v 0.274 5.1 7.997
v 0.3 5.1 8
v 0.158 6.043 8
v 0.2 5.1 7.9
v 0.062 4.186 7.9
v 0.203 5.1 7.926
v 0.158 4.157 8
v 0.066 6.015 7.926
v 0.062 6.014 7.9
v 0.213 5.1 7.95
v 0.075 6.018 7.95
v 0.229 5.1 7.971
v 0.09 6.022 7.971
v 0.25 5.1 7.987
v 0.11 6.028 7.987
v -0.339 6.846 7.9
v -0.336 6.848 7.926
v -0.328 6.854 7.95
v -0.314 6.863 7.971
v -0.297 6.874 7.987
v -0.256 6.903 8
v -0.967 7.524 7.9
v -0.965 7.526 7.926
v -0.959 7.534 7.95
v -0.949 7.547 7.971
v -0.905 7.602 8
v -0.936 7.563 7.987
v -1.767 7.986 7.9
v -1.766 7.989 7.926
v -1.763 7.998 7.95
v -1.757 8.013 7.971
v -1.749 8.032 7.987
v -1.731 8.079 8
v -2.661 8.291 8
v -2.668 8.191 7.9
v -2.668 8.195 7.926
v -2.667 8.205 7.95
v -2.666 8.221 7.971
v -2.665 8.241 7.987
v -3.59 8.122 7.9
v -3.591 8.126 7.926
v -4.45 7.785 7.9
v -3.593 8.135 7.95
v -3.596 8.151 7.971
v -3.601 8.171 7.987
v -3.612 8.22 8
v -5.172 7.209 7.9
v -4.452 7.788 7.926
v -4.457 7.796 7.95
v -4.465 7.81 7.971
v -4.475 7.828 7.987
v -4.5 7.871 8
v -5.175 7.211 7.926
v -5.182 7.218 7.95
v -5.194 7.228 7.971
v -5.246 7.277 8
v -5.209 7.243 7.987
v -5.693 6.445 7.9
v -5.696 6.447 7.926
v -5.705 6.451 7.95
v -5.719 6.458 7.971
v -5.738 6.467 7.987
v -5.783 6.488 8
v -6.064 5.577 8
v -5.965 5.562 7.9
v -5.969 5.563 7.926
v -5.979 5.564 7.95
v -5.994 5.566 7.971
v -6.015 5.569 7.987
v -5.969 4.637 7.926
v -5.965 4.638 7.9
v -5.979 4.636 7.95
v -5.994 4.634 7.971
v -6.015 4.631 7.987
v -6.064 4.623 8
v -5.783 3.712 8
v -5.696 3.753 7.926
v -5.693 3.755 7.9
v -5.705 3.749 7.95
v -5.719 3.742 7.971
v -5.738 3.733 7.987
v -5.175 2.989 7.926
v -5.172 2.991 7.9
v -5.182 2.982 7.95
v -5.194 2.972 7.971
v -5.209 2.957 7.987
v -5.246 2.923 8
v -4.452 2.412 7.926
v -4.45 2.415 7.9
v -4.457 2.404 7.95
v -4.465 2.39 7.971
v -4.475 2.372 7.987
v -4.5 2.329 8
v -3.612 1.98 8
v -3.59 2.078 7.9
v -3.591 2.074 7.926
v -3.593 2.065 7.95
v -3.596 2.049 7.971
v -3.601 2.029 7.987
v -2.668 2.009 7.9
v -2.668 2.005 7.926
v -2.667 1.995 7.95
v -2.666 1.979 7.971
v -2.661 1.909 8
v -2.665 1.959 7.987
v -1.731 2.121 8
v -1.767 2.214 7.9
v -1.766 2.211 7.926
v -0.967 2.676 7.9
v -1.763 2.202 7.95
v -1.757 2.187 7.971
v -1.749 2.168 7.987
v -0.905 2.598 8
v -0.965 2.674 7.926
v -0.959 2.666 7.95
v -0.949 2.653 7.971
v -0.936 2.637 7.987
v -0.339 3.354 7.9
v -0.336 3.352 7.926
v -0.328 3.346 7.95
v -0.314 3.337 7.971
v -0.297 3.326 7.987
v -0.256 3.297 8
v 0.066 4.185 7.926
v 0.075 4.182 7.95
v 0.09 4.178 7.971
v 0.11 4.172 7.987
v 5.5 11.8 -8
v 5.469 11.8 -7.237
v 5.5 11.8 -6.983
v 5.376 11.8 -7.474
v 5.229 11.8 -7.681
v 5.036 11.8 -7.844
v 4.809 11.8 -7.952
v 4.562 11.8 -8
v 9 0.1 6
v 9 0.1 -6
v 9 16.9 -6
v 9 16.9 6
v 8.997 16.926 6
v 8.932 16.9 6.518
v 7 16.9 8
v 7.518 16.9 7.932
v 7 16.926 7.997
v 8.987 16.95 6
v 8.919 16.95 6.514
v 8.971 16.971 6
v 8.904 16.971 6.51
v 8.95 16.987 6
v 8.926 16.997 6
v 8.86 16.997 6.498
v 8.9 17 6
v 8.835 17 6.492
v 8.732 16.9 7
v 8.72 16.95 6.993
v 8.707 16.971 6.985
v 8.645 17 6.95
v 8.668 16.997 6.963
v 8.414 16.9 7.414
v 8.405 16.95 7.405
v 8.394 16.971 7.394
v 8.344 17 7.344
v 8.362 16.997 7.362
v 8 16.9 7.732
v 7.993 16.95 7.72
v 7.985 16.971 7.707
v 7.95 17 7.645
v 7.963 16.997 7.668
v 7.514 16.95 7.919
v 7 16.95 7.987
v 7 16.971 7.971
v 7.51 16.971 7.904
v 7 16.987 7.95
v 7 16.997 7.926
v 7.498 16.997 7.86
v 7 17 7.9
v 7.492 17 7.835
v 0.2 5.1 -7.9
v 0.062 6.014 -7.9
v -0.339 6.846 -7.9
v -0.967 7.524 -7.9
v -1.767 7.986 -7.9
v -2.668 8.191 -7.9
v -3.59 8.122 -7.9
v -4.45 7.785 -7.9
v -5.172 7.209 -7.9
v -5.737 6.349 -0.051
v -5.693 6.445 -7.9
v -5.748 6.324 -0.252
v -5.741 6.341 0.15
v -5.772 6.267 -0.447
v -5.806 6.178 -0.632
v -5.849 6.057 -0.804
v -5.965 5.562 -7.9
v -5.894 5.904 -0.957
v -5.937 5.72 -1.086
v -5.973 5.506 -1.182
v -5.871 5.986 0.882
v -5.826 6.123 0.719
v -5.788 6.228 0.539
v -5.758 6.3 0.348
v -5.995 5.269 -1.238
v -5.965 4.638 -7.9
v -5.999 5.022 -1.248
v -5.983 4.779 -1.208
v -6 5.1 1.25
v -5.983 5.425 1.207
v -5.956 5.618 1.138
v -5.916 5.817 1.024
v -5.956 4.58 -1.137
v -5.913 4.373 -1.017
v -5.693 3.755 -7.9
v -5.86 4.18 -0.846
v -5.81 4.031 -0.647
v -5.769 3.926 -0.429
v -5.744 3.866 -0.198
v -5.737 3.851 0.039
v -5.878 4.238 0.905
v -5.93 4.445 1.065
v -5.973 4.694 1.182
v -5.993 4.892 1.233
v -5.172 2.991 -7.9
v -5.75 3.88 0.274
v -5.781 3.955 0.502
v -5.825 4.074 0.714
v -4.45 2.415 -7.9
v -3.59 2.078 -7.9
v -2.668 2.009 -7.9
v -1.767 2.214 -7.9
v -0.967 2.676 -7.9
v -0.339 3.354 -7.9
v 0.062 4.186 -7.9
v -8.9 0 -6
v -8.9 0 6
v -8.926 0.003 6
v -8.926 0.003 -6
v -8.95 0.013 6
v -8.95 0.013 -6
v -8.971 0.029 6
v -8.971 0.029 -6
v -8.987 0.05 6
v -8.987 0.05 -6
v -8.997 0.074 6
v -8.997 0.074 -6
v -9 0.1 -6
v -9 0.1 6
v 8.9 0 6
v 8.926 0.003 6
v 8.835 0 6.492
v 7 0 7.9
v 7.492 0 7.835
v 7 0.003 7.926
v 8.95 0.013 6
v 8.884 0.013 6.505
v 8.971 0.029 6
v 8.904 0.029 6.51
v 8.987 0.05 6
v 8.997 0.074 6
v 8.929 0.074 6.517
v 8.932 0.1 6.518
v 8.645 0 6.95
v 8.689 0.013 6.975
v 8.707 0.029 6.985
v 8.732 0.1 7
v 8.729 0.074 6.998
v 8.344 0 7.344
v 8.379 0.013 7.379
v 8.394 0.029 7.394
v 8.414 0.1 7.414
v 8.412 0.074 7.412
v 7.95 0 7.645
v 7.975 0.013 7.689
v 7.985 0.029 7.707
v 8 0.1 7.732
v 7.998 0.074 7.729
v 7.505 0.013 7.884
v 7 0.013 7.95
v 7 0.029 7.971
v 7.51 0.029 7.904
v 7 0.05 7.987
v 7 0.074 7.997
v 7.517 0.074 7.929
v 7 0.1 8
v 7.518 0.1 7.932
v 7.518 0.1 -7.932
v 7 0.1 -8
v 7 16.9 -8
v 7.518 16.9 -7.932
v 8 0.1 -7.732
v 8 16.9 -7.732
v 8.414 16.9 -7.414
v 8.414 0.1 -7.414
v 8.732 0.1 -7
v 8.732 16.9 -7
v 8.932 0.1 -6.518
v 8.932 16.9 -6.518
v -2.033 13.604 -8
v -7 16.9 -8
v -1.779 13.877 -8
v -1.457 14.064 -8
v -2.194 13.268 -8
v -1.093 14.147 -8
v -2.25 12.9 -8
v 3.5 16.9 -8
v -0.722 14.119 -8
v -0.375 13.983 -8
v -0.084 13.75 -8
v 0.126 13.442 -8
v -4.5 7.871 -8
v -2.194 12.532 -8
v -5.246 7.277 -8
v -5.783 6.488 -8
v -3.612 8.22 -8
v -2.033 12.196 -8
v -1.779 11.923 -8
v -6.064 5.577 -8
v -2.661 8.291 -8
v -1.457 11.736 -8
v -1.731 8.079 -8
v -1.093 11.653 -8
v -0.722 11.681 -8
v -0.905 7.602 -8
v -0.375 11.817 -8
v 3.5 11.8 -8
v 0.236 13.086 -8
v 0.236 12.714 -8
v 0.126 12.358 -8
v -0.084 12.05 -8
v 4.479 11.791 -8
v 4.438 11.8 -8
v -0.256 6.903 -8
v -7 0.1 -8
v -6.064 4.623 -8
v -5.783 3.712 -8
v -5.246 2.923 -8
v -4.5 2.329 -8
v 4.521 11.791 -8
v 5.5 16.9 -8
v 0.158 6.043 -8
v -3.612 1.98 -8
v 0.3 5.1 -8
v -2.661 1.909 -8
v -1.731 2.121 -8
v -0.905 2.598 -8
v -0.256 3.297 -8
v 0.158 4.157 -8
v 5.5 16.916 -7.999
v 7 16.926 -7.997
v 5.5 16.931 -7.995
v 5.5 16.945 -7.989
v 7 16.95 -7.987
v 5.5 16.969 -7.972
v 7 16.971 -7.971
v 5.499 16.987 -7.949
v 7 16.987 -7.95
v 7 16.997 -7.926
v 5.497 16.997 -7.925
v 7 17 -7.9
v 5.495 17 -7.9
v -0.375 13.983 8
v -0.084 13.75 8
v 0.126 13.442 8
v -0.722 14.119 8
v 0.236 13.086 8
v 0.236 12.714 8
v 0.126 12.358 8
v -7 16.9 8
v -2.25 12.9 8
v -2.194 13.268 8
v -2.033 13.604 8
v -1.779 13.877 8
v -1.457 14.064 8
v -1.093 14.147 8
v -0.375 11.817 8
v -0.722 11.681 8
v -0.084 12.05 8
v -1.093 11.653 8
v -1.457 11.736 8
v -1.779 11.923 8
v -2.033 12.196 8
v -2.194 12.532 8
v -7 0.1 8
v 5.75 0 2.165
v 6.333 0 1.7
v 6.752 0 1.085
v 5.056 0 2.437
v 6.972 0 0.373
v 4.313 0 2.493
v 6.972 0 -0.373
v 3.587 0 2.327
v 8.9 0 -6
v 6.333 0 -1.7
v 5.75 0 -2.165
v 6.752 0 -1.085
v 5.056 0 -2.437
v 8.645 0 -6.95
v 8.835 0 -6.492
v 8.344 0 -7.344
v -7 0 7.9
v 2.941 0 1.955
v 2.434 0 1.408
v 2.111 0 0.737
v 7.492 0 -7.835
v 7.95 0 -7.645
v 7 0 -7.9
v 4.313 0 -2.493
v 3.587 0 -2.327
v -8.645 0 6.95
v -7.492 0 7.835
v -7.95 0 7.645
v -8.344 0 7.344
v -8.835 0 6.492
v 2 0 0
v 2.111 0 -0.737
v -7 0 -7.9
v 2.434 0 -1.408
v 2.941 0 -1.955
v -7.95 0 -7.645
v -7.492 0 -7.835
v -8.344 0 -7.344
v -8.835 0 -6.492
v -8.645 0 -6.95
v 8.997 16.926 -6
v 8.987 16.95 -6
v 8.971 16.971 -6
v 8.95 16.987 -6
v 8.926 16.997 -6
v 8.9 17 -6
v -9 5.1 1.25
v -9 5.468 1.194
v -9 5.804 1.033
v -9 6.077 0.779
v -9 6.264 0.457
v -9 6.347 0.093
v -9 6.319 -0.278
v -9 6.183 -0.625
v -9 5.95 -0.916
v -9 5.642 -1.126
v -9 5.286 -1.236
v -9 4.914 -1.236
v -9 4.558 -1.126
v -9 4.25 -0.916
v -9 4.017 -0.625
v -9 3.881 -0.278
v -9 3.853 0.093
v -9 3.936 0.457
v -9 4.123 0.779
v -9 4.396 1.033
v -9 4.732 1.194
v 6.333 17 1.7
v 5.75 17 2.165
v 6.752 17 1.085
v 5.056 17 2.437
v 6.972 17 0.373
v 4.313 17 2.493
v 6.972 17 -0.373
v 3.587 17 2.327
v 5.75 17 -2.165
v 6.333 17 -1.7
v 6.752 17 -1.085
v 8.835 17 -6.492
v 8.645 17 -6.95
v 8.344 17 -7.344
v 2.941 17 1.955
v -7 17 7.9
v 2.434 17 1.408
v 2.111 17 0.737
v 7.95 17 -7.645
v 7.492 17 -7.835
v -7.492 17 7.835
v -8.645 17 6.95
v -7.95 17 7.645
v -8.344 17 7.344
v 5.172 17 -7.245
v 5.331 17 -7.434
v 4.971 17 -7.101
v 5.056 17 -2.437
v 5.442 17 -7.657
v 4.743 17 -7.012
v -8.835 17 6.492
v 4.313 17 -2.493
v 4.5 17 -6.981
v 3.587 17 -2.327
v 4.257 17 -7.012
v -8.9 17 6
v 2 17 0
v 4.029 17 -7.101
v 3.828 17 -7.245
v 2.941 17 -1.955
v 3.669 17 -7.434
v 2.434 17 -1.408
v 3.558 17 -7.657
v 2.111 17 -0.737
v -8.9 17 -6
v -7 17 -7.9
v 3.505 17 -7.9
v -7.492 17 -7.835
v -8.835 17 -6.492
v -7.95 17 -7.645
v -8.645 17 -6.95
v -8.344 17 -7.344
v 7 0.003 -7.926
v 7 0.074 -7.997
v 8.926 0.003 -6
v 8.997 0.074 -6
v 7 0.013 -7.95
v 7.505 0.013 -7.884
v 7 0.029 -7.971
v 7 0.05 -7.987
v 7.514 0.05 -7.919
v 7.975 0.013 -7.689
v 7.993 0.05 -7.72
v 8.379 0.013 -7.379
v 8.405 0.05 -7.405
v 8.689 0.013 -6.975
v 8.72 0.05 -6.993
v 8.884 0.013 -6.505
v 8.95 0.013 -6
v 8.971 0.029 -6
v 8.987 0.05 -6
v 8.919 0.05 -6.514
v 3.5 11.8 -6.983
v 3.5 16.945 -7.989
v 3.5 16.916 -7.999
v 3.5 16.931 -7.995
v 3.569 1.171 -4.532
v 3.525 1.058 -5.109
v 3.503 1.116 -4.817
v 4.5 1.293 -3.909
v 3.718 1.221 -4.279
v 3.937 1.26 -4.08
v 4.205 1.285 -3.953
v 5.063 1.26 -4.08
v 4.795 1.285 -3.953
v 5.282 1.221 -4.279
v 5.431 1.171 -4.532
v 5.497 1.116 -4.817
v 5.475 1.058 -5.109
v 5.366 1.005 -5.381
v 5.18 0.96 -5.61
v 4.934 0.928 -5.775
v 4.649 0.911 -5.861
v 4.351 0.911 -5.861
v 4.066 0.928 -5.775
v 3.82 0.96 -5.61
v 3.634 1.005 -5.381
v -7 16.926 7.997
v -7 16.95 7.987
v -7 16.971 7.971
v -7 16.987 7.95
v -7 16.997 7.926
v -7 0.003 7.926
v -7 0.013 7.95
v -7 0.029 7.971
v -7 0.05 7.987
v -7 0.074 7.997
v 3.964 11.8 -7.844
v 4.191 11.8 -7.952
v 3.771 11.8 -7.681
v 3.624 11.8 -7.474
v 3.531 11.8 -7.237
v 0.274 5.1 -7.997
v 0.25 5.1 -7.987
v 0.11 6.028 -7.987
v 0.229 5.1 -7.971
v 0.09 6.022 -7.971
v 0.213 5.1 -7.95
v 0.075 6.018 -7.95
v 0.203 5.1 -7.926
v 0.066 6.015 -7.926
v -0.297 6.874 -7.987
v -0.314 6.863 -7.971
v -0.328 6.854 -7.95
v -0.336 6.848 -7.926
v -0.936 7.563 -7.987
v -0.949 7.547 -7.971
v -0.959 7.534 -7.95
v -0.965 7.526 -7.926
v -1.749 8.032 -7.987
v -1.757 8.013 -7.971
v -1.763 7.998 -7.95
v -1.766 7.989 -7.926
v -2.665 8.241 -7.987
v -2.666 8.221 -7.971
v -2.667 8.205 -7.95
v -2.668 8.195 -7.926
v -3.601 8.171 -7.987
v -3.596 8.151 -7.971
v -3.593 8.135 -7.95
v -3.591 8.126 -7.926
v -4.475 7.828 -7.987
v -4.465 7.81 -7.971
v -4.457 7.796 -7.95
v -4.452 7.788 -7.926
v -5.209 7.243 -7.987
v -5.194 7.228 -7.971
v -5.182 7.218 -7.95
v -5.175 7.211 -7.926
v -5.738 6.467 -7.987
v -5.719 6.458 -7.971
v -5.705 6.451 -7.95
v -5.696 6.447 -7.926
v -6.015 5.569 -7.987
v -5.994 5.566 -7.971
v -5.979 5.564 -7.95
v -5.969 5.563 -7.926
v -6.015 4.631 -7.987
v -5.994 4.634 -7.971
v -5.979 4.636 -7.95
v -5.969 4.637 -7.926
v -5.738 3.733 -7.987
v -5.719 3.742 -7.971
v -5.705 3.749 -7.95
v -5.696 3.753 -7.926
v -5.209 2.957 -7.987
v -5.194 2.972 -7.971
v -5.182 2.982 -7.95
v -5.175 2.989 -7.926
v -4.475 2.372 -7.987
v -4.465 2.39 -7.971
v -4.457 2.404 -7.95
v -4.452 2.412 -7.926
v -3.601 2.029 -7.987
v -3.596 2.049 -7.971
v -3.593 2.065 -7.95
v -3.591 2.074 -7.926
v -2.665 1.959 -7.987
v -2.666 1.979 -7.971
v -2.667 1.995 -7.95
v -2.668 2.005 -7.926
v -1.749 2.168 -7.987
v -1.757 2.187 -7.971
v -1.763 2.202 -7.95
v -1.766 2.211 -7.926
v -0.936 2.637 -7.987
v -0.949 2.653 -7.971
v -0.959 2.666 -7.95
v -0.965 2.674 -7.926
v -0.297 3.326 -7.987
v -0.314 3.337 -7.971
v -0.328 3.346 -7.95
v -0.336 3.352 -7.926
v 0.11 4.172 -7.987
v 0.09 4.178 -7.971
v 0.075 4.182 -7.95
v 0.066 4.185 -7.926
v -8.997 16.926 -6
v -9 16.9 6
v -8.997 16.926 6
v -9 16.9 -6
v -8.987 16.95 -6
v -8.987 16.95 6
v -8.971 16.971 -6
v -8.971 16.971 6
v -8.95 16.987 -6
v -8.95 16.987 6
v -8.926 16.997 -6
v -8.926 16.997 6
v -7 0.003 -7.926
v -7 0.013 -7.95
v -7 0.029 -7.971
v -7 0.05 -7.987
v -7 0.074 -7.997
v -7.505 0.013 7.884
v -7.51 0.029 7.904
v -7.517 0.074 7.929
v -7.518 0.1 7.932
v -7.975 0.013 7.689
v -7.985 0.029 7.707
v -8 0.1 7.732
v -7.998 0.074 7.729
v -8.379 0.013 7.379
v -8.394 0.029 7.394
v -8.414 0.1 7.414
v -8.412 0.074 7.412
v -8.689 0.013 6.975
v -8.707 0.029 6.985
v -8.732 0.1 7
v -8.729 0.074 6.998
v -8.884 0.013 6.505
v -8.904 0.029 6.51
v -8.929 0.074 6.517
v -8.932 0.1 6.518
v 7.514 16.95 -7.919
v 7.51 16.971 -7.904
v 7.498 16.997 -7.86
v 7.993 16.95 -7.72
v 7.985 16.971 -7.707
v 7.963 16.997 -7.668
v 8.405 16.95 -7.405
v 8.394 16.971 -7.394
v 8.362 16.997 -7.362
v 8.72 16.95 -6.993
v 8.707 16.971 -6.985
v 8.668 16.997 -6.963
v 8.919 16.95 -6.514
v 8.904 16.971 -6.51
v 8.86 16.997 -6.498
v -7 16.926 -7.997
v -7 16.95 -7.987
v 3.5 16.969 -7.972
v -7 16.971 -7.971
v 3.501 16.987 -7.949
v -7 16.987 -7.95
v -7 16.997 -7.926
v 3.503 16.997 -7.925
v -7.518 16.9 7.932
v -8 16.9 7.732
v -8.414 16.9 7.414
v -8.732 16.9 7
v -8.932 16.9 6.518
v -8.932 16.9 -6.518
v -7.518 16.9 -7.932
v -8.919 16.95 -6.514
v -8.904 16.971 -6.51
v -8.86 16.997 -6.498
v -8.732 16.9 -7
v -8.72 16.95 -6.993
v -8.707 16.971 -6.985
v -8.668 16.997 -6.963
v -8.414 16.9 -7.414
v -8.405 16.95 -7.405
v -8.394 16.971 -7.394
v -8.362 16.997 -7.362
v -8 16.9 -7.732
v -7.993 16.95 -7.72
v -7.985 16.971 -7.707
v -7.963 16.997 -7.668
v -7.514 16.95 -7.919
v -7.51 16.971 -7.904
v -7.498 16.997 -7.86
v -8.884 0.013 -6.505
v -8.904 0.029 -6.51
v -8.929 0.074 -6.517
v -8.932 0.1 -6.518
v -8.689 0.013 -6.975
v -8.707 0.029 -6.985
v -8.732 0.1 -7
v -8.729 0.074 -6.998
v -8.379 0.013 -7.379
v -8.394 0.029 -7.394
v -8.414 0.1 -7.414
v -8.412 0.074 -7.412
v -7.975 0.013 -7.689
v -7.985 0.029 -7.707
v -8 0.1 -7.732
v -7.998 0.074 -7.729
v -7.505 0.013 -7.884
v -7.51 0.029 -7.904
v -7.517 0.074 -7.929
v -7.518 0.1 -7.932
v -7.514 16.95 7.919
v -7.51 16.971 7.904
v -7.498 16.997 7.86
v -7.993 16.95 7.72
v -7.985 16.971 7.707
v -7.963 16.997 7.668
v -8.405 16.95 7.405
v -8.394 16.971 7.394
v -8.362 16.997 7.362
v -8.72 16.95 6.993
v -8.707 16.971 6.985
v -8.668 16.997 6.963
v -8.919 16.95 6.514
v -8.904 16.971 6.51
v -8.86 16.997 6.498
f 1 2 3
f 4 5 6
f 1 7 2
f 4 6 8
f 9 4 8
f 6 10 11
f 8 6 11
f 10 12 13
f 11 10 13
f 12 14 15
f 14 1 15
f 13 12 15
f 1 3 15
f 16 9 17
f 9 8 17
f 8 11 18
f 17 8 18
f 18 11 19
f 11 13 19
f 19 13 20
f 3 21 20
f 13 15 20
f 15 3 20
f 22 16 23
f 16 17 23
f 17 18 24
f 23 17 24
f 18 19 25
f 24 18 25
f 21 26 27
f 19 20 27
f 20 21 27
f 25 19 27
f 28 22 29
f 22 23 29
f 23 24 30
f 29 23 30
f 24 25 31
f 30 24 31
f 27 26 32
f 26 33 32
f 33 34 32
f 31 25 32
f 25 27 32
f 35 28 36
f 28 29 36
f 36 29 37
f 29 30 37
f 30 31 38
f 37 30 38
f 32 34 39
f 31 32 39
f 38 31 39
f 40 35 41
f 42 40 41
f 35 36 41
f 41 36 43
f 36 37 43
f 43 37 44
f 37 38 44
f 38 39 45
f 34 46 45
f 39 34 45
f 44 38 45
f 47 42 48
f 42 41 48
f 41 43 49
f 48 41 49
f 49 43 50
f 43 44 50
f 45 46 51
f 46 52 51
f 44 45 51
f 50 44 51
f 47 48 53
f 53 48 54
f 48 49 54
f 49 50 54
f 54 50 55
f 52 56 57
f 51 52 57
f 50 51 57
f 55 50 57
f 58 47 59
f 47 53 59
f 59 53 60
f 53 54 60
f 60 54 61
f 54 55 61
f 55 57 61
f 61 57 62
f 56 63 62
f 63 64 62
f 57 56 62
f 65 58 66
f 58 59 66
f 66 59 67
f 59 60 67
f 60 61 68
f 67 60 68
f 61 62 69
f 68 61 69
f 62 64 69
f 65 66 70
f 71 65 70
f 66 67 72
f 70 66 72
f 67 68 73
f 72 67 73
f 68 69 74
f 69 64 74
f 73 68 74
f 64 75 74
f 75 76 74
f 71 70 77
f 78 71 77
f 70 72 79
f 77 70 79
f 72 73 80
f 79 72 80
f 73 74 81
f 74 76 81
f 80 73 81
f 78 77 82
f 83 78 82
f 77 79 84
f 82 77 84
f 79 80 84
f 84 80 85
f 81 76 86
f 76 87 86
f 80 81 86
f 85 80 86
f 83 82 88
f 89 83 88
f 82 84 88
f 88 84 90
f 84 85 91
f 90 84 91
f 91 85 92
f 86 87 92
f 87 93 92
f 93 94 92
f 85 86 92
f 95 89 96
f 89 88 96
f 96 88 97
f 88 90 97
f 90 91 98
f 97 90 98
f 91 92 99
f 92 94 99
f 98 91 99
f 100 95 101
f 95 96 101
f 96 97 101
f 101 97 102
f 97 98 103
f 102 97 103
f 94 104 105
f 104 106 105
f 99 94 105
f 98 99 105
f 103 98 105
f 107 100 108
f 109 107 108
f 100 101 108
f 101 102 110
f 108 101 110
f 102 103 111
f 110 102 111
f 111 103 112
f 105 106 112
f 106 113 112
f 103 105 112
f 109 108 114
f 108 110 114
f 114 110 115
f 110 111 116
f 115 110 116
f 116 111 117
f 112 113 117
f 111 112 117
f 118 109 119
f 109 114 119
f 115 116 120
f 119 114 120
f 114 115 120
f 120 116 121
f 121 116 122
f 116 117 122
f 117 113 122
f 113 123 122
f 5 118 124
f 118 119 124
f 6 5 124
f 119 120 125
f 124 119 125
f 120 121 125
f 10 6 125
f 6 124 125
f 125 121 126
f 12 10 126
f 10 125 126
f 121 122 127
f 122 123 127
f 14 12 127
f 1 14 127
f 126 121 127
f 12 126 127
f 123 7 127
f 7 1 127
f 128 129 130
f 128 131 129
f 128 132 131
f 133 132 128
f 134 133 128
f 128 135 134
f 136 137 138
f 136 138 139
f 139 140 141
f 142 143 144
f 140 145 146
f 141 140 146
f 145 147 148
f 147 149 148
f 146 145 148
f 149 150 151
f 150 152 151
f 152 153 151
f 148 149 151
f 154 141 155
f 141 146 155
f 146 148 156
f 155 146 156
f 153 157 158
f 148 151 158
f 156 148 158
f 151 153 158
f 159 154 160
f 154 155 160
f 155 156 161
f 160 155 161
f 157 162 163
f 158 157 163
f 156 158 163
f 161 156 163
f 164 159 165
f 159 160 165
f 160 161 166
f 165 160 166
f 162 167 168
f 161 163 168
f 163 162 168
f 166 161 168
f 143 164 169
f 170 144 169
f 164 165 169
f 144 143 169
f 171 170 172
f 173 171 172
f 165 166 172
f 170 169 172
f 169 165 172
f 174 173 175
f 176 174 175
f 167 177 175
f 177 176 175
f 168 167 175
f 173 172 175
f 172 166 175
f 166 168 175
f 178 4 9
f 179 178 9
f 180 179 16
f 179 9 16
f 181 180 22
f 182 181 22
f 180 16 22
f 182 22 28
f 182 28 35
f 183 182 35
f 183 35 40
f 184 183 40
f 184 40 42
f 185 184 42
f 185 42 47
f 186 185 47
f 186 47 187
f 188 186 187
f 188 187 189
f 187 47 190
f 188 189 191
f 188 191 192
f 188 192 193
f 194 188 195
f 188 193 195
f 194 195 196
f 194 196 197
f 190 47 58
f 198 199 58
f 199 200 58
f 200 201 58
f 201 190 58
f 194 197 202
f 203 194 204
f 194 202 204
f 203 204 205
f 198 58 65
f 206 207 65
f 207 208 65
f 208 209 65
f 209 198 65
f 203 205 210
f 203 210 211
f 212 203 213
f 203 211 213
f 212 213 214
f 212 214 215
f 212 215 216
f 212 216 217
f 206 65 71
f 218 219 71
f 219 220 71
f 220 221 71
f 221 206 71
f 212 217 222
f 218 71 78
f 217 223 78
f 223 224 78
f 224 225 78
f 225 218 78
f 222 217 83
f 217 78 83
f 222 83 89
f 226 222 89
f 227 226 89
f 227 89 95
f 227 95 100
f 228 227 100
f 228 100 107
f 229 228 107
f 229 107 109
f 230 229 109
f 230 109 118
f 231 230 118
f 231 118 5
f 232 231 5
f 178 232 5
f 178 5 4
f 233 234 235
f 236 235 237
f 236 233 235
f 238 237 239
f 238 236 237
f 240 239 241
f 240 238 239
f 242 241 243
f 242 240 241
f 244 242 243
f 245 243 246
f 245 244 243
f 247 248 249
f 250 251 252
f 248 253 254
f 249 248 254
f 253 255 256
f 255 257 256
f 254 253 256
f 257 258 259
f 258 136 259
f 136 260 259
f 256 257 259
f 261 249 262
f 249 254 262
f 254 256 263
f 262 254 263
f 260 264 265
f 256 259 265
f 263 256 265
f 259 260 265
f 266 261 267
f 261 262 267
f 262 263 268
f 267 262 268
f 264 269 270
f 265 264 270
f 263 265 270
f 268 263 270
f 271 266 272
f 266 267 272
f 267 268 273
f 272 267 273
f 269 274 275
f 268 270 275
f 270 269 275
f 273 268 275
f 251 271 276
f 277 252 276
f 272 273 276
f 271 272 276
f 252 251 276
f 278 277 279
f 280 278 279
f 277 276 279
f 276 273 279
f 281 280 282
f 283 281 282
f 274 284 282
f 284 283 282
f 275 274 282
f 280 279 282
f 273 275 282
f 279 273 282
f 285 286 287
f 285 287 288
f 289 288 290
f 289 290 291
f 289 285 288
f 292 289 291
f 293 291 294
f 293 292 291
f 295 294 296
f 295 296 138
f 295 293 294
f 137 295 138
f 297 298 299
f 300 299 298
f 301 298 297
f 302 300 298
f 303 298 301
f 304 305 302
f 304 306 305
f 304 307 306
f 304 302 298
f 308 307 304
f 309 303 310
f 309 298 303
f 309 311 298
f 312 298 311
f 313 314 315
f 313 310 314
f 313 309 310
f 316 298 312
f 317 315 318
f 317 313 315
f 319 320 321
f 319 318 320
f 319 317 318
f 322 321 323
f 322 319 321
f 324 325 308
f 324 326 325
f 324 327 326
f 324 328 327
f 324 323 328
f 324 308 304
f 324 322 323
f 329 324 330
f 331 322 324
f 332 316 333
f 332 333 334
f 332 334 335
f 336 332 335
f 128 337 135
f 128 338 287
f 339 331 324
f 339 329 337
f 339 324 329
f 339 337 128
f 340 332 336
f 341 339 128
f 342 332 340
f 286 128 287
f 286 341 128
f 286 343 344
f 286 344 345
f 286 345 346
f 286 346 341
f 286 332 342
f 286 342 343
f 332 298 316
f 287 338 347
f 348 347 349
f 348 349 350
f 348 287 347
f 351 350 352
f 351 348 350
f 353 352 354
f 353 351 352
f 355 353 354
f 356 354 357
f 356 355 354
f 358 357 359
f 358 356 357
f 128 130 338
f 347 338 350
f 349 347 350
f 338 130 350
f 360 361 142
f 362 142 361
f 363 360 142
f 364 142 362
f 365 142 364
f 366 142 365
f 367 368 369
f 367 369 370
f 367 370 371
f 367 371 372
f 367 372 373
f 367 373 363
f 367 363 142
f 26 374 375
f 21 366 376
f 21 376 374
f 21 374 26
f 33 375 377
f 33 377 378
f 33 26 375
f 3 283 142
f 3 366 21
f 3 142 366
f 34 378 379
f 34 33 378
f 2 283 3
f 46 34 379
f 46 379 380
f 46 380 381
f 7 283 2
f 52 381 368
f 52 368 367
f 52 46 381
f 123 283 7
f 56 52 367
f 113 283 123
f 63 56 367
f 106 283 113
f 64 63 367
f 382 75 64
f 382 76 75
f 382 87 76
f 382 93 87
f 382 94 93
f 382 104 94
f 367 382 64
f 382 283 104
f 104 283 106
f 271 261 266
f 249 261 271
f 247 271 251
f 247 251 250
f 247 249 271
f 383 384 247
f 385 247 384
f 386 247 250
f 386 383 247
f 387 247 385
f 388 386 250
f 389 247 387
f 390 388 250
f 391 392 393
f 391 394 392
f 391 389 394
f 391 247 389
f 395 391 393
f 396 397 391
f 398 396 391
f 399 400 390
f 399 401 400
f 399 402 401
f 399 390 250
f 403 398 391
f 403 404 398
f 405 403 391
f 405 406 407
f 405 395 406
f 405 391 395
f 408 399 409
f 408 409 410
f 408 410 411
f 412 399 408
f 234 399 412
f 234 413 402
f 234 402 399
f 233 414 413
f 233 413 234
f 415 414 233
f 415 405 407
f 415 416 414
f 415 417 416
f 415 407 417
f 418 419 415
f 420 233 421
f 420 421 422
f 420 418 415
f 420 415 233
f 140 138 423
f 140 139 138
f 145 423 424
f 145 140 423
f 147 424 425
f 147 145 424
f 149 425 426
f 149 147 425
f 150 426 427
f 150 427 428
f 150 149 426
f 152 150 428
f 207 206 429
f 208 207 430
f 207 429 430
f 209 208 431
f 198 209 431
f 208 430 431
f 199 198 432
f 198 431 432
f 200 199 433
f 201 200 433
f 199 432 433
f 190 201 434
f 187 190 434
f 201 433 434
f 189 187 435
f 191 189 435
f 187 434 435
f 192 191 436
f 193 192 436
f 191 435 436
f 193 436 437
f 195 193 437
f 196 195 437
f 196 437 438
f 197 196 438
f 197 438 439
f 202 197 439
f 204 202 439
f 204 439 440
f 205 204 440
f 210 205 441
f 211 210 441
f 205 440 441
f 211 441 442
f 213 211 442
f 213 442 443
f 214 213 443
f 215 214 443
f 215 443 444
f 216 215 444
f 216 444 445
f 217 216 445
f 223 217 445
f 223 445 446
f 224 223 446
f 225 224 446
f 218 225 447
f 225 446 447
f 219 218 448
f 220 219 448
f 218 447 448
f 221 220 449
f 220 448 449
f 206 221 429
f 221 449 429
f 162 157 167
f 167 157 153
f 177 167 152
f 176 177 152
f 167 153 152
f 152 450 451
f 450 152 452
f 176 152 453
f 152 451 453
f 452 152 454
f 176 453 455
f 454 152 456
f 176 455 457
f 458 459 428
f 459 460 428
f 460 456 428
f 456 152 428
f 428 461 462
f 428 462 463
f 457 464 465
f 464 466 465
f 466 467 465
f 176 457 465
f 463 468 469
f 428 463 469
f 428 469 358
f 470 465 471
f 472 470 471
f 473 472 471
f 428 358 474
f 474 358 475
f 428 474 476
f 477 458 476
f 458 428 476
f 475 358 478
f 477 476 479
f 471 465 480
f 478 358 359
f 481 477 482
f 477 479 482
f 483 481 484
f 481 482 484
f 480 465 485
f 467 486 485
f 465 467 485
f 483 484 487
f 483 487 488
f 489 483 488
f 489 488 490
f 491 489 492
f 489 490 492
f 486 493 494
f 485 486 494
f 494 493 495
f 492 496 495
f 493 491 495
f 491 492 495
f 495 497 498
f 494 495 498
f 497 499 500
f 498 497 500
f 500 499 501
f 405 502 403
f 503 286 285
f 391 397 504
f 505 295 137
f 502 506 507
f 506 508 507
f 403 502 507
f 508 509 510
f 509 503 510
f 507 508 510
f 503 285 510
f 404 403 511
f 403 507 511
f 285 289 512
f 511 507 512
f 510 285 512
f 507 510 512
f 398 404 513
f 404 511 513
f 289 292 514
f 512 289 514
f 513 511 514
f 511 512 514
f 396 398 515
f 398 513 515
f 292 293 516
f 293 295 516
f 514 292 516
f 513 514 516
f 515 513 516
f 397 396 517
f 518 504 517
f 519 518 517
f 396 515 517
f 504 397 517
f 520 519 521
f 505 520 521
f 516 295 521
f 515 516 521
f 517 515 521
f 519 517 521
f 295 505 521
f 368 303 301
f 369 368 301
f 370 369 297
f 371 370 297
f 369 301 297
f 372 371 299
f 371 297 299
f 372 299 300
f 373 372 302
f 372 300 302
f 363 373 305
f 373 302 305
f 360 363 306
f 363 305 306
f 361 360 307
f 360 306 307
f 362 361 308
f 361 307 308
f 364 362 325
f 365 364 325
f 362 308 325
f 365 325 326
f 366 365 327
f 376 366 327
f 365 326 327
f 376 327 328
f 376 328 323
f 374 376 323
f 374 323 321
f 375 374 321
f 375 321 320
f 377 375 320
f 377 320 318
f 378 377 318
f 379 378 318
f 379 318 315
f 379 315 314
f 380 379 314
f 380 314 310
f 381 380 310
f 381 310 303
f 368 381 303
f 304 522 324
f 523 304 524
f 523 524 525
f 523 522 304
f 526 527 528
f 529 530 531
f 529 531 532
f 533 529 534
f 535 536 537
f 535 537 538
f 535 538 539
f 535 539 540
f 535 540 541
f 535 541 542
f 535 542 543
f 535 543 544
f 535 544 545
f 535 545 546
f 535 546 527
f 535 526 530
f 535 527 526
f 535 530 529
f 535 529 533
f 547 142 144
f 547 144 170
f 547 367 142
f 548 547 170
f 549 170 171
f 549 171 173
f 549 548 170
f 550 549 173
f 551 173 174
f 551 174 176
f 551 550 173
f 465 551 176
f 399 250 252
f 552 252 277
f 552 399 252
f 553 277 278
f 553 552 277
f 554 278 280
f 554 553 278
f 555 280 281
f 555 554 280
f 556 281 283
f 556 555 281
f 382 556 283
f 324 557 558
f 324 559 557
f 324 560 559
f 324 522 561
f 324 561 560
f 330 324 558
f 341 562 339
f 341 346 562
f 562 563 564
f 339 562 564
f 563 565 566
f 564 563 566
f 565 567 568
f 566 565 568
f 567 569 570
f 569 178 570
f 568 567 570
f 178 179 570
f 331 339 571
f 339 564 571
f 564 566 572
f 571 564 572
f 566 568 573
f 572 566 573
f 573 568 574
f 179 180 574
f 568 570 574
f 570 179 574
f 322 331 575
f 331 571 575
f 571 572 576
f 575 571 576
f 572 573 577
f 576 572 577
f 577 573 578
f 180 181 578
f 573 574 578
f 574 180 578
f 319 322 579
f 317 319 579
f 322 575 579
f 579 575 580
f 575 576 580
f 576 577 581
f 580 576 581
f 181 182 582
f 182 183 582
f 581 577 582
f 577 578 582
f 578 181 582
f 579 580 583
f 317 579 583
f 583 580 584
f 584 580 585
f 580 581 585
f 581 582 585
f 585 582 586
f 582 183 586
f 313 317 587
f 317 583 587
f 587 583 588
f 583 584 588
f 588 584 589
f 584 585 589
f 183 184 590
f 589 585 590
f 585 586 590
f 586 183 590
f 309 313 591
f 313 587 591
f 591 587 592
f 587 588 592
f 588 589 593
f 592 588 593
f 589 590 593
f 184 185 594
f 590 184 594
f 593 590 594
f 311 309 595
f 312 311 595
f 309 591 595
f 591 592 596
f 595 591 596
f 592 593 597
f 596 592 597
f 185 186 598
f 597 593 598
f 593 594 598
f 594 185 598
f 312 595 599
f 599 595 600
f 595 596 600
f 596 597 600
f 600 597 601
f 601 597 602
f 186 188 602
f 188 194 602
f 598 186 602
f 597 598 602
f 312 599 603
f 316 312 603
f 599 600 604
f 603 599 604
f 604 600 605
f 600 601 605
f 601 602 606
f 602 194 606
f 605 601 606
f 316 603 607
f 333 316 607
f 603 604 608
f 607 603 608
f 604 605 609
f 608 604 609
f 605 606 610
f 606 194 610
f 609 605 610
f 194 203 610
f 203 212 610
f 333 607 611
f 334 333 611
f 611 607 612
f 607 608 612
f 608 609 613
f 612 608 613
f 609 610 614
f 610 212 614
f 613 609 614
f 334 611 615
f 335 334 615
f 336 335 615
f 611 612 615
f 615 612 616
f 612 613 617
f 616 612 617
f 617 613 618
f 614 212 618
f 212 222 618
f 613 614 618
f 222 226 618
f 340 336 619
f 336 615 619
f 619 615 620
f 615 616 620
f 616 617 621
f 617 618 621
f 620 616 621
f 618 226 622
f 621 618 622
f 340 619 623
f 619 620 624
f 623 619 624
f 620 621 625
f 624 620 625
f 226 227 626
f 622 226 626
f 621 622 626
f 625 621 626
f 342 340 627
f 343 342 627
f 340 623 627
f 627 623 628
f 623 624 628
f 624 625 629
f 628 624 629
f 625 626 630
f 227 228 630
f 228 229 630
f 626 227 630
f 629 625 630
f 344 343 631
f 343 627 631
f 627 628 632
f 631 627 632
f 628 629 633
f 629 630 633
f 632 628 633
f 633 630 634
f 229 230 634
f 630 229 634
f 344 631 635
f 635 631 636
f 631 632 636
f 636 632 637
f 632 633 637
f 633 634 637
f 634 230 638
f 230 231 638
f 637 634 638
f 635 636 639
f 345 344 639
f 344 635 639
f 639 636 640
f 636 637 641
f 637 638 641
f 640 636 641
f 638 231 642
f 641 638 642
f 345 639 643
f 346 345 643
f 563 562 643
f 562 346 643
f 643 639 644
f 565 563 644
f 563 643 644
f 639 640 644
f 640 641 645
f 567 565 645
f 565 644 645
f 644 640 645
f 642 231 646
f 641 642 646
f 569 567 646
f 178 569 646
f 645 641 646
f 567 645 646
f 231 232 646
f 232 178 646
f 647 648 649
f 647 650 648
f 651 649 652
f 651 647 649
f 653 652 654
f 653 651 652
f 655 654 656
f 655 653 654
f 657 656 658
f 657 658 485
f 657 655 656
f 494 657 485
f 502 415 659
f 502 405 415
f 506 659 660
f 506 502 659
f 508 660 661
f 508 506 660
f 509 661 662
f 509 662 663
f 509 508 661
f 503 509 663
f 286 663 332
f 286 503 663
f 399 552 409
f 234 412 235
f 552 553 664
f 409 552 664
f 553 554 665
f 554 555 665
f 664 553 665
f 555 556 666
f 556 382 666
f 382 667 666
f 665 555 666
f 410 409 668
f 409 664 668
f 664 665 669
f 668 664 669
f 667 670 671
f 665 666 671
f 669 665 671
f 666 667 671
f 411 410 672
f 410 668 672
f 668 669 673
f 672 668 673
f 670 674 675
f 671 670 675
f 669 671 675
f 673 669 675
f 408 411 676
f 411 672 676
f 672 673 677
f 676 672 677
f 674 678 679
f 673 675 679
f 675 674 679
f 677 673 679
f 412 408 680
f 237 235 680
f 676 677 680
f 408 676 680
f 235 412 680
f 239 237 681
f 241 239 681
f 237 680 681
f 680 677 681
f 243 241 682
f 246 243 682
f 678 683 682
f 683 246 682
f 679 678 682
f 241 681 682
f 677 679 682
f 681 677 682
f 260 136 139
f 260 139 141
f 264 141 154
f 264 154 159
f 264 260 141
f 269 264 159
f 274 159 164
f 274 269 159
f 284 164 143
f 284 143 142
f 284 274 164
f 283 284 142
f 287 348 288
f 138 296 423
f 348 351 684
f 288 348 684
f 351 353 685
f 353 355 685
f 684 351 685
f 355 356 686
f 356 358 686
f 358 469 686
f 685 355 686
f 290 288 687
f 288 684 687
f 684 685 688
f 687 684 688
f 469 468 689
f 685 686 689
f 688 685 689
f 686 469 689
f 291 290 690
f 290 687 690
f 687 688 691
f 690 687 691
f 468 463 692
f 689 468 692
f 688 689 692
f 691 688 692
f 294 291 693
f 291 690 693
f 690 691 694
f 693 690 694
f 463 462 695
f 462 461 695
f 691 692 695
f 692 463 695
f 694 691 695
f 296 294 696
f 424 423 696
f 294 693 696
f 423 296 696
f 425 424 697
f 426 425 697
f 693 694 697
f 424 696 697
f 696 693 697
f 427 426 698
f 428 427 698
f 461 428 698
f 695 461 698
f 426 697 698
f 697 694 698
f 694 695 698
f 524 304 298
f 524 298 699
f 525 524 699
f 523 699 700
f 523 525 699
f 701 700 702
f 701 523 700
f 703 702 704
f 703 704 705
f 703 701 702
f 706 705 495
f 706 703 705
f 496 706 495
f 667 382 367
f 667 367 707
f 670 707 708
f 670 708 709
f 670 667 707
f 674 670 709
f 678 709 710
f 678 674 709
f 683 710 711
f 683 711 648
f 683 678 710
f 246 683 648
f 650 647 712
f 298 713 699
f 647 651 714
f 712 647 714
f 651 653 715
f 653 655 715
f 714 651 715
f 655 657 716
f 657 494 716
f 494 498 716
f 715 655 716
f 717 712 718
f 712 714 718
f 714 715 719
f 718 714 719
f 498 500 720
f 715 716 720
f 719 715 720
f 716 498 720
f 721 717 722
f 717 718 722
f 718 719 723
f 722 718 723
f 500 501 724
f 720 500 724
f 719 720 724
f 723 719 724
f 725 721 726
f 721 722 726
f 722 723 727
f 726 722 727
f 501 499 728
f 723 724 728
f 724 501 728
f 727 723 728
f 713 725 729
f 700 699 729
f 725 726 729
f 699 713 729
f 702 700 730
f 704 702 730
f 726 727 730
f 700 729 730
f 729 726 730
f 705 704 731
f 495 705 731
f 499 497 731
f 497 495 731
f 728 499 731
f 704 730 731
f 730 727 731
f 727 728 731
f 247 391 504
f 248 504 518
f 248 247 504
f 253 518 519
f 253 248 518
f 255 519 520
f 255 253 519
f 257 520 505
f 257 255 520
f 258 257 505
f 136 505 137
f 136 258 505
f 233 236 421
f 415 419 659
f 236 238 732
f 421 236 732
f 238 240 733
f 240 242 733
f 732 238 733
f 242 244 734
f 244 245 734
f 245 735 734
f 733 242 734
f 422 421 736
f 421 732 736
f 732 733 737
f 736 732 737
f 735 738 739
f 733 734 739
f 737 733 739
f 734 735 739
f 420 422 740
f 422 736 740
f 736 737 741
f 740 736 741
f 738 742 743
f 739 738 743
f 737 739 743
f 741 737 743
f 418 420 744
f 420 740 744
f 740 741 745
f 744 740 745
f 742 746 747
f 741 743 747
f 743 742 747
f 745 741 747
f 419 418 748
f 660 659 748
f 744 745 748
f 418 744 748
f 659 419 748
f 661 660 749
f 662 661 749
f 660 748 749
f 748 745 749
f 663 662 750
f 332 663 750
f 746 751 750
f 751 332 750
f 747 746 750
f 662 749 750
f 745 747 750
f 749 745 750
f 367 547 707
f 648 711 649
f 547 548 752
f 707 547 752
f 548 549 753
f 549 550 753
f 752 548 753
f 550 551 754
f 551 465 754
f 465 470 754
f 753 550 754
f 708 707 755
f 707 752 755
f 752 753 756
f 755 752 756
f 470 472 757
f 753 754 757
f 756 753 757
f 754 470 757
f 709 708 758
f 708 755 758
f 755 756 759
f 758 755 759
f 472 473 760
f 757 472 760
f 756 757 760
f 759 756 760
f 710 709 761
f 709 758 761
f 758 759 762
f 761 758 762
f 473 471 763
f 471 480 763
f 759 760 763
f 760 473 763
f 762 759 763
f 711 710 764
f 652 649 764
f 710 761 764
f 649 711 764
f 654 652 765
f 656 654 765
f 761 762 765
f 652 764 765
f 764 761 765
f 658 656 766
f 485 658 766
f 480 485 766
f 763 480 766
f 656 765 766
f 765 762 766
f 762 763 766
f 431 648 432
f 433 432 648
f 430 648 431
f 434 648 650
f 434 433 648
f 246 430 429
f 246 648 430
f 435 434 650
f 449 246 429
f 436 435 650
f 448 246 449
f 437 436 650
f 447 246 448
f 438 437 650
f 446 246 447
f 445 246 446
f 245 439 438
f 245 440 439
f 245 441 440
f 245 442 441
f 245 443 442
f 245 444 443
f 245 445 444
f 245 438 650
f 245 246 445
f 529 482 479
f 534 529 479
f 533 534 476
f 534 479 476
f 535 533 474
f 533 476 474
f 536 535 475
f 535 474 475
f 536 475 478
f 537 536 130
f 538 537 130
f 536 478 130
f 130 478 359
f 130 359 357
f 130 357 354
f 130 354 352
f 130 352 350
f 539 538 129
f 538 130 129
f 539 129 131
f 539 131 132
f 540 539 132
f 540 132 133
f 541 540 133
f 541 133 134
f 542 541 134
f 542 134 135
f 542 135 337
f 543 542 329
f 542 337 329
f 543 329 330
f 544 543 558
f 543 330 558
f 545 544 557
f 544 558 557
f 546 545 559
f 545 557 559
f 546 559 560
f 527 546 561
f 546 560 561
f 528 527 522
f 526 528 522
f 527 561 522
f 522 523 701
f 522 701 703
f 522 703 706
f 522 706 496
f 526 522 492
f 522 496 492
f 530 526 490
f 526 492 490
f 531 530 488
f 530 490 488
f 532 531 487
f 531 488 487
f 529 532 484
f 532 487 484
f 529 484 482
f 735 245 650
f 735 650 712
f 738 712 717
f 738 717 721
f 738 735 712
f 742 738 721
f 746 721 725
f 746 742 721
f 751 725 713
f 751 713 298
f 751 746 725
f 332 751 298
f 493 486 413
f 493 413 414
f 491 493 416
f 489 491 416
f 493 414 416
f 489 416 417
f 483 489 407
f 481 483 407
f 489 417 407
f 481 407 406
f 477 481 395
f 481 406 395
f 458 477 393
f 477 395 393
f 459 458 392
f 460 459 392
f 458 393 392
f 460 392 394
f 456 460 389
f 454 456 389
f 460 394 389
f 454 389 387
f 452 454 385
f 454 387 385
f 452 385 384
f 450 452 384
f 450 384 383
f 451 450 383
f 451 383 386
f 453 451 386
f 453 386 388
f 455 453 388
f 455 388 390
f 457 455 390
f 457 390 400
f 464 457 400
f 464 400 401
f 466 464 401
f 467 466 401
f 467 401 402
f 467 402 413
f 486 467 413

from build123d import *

# Parameters (mm, degrees)
BOSS_EXTRUDE1_DEPTH    = 17
M6_TAPPED_HOLE1_D      = 5
CUT_EXTRUDE1_REACH     = 27.02
SKETCH5_R              = 3.1
M3_TAPPED_HOLE1_REACH  = 28.019
M3_TAPPED_HOLE1_BORE_R = 1.25
M3_TAPPED_HOLE2_D      = 2.5
SKETCH13_R             = 1
CUT_EXTRUDE2_DEPTH     = 16.2
CUT_EXTRUDE3_START     = 3.5
CUT_EXTRUDE3_DEPTH     = 2
FILLET1_R              = 0.1


with BuildPart() as part:
    # Sketch1 → Boss-Extrude1 (new body)
    with BuildSketch(Plane(origin=(0, 0, 0), x_dir=(1, 0, 0), z_dir=(0, 1, 0))):
        with BuildLine():
            Line((-7, 8), (7, 8))
            ThreePointArc((7, 8), (8.414213562, 7.414213562), (9, 6))
            Line((9, 6), (9, -6))
            ThreePointArc((9, -6), (8.414213562, -7.414213562), (7, -8))
            Line((7, -8), (-7, -8))
            ThreePointArc((-7, -8), (-8.414213562, -7.414213562), (-9, -6))
            Line((-9, -6), (-9, 6))
            ThreePointArc((-9, 6), (-8.414213562, 7.414213562), (-7, 8))
        make_face()
    extrude(amount=BOSS_EXTRUDE1_DEPTH)

    # M6 Tapped Hole1 (through all)
    with Locations(Plane(origin=(0, 17, 0), x_dir=(1, 0, 0), z_dir=(0, 1, 0))):
        with Locations((4.5, 0)):
            Hole(M6_TAPPED_HOLE1_D / 2)

    # Sketch5 → Cut-Extrude1 (cut, up to next)
    with BuildSketch(Plane.XY.offset(8), mode=Mode.PRIVATE) as cut_extrude1_sk1:
        with Locations((-2.9, 5.1)):
            Circle(SKETCH5_R)
    cut_extrude1_tool1 = extrude(cut_extrude1_sk1.sketch, amount=-CUT_EXTRUDE1_REACH, mode=Mode.PRIVATE) & part.part
    add(cut_extrude1_tool1.solids().sort_by_distance((-2.9, 5.1, 8))[0], mode=Mode.SUBTRACT)

    # M3 Tapped Hole1 bore → M3 Tapped Hole1 (cut, up to next)
    with BuildSketch(Plane.ZY.offset(9), mode=Mode.PRIVATE) as m3_tapped_hole1_sk1:
        with Locations((0, 5.1)):
            Circle(M3_TAPPED_HOLE1_BORE_R)
    m3_tapped_hole1_tool1 = extrude(m3_tapped_hole1_sk1.sketch, amount=-M3_TAPPED_HOLE1_REACH, mode=Mode.PRIVATE) & part.part
    add(m3_tapped_hole1_tool1.solids().sort_by_distance((-9, 5.1, 0))[0], mode=Mode.SUBTRACT)

    # M3 Tapped Hole2 (through all)
    with Locations(Plane.XY.offset(8)):
        with Locations((-1, 12.9)):
            Hole(M3_TAPPED_HOLE2_D / 2)

    # Sketch13 → Cut-Extrude2 (cut)
    with BuildSketch(Plane(origin=(0, 17.880667156, -3.496925738), x_dir=(1, 0, 0), z_dir=(0, 0.9814078107791567, -0.19193412656863024))):
        with Locations(Location((4.5, 4.588382335, 0), (0, 0, 270))):
            Circle(SKETCH13_R)
    extrude(amount=-CUT_EXTRUDE2_DEPTH, mode=Mode.SUBTRACT)

    # Cut-Extrude3: read off the stored shape, not the designer's step
    # Cut-Extrude3 outline → Cut-Extrude3 (cut)
    with BuildSketch(Plane.YZ.offset(CUT_EXTRUDE3_START)):
        Polygon((17, -8), (11.8, -6.983034935), (11.8, -8), align=None)
    extrude(amount=CUT_EXTRUDE3_DEPTH, mode=Mode.SUBTRACT)

    # Fillet1
    fillet1_edges = [part.edges().sort_by_distance(p)[0] for p in [
        (8.414213562, 0, -7.414213562),
        (9, 0, 0),
        (8.414213562, 0, 7.414213562),
        (0, 0, 8),
        (-8.414213562, 0, 7.414213562),
        (-9, 0, 0),
        (-8.414213562, 0, -7.414213562),
        (6.25, 17, -8),
        (8.414213562, 17, -7.414213562),
        (9, 17, 0),
        (8.414213562, 17, 7.414213562),
        (0, 17, 8),
        (-8.414213562, 17, 7.414213562),
        (-9, 17, 0),
        (-8.414213562, 17, -7.414213562),
        (-6, 5.1, 8),
        (0, 0, -8),
        (-6, 5.1, -8),
        (-1.75, 17, -8),
    ]]
    fillet(fillet1_edges, radius=FILLET1_R)


solid = part.part
